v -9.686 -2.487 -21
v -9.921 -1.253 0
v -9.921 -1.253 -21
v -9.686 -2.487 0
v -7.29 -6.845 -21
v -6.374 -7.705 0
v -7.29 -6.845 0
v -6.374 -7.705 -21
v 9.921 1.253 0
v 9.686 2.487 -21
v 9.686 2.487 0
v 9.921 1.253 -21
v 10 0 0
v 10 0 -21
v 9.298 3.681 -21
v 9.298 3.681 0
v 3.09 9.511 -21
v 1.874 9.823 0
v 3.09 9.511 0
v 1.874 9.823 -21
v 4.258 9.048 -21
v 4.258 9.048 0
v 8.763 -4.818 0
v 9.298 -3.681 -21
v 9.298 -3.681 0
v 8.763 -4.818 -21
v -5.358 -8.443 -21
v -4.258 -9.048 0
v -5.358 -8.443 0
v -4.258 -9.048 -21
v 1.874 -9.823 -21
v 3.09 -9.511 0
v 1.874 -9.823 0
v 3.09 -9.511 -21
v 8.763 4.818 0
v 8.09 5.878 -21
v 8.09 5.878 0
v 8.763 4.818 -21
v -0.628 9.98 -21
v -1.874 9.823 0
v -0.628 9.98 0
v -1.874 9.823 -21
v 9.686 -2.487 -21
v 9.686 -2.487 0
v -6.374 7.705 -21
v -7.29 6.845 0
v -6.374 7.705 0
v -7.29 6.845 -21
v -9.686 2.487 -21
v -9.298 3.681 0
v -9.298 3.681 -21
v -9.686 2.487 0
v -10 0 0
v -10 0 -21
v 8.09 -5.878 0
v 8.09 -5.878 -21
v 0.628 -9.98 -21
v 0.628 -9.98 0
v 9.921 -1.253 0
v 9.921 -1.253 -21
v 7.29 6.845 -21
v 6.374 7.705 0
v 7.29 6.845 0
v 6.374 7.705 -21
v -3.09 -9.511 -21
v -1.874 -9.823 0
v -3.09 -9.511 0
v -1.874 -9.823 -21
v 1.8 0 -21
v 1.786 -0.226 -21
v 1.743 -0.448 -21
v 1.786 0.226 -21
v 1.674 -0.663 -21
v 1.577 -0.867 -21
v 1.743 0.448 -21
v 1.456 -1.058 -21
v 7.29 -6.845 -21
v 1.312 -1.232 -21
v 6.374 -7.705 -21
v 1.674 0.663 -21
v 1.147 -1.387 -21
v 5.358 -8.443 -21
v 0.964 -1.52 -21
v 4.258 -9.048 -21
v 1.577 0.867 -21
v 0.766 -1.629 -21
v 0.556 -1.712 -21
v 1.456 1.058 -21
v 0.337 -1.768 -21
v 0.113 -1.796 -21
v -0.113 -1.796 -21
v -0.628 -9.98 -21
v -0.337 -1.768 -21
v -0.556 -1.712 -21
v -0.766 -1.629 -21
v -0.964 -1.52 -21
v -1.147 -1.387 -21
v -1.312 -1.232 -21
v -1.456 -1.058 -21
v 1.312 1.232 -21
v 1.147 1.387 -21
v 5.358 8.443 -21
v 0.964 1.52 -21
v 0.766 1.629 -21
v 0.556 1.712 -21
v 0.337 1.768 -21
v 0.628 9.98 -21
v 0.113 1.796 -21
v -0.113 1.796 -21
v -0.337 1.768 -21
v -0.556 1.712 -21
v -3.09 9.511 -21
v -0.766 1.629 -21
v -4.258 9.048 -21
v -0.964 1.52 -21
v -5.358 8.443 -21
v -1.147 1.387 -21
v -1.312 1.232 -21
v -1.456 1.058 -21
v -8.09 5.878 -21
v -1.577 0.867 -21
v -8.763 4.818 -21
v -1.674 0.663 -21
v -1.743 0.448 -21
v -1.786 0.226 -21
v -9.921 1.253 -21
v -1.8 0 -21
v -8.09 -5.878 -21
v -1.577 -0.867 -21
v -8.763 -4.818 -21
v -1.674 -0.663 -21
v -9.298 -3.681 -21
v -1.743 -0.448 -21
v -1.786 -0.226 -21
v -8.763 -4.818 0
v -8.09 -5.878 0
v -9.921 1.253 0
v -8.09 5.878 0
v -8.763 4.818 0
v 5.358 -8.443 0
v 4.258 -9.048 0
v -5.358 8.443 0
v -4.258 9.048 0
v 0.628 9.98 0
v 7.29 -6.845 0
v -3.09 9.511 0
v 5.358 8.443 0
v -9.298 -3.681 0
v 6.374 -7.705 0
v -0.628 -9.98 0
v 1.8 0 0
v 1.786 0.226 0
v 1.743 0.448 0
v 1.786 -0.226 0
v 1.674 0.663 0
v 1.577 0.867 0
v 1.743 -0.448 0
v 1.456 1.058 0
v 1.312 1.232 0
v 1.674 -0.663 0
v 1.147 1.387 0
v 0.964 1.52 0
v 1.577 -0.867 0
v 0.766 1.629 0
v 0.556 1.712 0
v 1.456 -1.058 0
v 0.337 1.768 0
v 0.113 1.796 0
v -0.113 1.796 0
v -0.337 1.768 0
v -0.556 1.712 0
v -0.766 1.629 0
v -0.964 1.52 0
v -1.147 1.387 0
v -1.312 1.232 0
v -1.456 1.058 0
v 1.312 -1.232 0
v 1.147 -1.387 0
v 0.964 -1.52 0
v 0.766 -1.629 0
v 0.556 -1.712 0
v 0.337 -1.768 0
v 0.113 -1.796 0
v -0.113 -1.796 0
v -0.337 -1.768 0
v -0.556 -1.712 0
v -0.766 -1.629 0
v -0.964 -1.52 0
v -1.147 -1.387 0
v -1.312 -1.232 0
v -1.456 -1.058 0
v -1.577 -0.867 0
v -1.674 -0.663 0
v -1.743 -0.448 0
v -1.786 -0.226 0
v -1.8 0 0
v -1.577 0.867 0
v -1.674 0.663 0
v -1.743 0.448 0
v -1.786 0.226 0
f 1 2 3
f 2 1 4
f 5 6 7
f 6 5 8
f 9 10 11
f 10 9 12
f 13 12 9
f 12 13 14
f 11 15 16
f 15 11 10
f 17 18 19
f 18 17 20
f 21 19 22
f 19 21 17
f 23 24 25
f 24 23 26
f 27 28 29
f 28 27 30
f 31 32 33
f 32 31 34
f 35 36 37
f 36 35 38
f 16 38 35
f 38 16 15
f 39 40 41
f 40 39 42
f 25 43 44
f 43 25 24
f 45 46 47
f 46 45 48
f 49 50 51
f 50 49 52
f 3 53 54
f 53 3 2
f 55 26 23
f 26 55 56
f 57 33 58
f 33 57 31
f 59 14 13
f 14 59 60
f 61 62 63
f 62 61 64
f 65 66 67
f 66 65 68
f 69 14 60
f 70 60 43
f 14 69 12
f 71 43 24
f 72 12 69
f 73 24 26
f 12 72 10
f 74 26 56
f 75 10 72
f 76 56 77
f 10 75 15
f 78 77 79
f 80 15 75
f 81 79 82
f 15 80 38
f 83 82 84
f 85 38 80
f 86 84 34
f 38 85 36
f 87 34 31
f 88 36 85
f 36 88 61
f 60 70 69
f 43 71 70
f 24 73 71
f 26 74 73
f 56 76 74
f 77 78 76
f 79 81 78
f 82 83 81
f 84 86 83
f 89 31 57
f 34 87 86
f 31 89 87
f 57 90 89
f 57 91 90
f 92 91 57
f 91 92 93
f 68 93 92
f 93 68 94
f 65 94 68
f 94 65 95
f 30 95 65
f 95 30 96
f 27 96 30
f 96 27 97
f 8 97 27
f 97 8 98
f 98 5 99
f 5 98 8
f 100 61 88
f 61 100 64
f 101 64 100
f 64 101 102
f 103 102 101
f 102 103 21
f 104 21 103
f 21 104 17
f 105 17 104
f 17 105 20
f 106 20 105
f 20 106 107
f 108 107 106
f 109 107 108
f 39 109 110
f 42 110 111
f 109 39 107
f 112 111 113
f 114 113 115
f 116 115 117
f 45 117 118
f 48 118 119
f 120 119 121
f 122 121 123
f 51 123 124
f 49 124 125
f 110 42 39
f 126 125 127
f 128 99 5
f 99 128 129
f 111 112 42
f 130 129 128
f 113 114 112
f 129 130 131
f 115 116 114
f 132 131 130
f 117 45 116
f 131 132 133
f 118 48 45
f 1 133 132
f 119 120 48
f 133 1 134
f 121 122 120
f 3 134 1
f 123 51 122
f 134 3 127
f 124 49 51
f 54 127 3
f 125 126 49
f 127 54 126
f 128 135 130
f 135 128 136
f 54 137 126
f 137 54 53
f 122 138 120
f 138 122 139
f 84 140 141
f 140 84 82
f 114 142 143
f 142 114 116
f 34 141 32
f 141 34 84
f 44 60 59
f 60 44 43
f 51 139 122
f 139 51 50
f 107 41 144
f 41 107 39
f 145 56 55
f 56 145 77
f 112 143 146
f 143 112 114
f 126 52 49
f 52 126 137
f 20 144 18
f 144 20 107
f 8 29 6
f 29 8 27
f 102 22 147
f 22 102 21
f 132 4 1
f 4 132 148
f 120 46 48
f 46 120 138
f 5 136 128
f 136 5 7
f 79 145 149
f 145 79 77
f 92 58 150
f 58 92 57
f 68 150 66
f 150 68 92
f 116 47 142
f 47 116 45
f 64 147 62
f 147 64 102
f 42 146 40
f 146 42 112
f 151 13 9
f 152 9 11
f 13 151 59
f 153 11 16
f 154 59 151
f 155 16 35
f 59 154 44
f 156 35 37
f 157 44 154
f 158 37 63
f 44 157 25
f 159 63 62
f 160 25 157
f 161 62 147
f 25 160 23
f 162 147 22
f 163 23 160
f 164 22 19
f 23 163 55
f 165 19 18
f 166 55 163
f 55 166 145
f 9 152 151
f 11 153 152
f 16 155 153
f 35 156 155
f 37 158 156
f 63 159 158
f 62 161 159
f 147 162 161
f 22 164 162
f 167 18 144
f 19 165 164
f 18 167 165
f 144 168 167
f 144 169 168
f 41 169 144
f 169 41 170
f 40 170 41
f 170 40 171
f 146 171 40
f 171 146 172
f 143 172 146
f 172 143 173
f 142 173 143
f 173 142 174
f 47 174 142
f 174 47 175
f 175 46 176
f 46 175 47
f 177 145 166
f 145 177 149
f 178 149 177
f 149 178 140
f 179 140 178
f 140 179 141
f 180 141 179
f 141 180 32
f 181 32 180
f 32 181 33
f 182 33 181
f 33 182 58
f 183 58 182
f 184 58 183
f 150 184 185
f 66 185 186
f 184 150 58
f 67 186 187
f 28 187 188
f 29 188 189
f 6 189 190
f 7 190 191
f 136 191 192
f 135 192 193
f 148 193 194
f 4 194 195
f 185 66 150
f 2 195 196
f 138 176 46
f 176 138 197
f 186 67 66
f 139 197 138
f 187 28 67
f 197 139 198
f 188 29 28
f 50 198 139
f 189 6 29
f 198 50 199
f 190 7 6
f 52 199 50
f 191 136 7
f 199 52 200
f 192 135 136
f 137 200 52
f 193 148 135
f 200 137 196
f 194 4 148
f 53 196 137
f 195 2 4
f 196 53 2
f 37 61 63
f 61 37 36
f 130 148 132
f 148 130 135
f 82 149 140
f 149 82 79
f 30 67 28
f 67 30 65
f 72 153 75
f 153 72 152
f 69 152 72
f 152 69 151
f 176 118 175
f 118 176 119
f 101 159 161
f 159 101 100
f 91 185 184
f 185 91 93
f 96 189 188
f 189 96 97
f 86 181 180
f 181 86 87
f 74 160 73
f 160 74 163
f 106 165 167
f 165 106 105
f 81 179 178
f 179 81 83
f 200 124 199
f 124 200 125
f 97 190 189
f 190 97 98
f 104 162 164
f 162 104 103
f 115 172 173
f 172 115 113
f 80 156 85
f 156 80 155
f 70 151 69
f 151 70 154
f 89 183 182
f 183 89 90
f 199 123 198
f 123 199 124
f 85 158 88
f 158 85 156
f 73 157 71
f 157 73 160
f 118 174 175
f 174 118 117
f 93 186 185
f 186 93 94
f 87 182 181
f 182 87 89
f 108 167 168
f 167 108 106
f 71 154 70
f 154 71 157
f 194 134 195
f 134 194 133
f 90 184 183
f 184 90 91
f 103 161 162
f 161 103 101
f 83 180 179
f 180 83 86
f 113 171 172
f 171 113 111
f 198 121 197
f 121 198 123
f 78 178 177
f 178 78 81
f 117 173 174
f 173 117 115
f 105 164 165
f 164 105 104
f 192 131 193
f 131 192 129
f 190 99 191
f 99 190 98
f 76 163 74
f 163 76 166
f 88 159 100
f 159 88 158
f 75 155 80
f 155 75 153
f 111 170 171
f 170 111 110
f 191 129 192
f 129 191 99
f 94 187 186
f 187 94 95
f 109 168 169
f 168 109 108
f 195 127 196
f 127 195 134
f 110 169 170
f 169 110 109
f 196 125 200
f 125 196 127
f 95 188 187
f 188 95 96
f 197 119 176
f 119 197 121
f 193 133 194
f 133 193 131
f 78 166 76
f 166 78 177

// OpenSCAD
$fn = 50;


difference() {
	union() {
		translate(v = [0, 0, -21.0000000000]) {
			cylinder(h = 21, r = 10.0000000000);
		}
		cylinder(h = 0, r = 16.0000000000);
	}
	union() {
		#translate(v = [0, 0, -21]) {
			cylinder(h = 21, r = 1.8000000000);
		}
	}
}
